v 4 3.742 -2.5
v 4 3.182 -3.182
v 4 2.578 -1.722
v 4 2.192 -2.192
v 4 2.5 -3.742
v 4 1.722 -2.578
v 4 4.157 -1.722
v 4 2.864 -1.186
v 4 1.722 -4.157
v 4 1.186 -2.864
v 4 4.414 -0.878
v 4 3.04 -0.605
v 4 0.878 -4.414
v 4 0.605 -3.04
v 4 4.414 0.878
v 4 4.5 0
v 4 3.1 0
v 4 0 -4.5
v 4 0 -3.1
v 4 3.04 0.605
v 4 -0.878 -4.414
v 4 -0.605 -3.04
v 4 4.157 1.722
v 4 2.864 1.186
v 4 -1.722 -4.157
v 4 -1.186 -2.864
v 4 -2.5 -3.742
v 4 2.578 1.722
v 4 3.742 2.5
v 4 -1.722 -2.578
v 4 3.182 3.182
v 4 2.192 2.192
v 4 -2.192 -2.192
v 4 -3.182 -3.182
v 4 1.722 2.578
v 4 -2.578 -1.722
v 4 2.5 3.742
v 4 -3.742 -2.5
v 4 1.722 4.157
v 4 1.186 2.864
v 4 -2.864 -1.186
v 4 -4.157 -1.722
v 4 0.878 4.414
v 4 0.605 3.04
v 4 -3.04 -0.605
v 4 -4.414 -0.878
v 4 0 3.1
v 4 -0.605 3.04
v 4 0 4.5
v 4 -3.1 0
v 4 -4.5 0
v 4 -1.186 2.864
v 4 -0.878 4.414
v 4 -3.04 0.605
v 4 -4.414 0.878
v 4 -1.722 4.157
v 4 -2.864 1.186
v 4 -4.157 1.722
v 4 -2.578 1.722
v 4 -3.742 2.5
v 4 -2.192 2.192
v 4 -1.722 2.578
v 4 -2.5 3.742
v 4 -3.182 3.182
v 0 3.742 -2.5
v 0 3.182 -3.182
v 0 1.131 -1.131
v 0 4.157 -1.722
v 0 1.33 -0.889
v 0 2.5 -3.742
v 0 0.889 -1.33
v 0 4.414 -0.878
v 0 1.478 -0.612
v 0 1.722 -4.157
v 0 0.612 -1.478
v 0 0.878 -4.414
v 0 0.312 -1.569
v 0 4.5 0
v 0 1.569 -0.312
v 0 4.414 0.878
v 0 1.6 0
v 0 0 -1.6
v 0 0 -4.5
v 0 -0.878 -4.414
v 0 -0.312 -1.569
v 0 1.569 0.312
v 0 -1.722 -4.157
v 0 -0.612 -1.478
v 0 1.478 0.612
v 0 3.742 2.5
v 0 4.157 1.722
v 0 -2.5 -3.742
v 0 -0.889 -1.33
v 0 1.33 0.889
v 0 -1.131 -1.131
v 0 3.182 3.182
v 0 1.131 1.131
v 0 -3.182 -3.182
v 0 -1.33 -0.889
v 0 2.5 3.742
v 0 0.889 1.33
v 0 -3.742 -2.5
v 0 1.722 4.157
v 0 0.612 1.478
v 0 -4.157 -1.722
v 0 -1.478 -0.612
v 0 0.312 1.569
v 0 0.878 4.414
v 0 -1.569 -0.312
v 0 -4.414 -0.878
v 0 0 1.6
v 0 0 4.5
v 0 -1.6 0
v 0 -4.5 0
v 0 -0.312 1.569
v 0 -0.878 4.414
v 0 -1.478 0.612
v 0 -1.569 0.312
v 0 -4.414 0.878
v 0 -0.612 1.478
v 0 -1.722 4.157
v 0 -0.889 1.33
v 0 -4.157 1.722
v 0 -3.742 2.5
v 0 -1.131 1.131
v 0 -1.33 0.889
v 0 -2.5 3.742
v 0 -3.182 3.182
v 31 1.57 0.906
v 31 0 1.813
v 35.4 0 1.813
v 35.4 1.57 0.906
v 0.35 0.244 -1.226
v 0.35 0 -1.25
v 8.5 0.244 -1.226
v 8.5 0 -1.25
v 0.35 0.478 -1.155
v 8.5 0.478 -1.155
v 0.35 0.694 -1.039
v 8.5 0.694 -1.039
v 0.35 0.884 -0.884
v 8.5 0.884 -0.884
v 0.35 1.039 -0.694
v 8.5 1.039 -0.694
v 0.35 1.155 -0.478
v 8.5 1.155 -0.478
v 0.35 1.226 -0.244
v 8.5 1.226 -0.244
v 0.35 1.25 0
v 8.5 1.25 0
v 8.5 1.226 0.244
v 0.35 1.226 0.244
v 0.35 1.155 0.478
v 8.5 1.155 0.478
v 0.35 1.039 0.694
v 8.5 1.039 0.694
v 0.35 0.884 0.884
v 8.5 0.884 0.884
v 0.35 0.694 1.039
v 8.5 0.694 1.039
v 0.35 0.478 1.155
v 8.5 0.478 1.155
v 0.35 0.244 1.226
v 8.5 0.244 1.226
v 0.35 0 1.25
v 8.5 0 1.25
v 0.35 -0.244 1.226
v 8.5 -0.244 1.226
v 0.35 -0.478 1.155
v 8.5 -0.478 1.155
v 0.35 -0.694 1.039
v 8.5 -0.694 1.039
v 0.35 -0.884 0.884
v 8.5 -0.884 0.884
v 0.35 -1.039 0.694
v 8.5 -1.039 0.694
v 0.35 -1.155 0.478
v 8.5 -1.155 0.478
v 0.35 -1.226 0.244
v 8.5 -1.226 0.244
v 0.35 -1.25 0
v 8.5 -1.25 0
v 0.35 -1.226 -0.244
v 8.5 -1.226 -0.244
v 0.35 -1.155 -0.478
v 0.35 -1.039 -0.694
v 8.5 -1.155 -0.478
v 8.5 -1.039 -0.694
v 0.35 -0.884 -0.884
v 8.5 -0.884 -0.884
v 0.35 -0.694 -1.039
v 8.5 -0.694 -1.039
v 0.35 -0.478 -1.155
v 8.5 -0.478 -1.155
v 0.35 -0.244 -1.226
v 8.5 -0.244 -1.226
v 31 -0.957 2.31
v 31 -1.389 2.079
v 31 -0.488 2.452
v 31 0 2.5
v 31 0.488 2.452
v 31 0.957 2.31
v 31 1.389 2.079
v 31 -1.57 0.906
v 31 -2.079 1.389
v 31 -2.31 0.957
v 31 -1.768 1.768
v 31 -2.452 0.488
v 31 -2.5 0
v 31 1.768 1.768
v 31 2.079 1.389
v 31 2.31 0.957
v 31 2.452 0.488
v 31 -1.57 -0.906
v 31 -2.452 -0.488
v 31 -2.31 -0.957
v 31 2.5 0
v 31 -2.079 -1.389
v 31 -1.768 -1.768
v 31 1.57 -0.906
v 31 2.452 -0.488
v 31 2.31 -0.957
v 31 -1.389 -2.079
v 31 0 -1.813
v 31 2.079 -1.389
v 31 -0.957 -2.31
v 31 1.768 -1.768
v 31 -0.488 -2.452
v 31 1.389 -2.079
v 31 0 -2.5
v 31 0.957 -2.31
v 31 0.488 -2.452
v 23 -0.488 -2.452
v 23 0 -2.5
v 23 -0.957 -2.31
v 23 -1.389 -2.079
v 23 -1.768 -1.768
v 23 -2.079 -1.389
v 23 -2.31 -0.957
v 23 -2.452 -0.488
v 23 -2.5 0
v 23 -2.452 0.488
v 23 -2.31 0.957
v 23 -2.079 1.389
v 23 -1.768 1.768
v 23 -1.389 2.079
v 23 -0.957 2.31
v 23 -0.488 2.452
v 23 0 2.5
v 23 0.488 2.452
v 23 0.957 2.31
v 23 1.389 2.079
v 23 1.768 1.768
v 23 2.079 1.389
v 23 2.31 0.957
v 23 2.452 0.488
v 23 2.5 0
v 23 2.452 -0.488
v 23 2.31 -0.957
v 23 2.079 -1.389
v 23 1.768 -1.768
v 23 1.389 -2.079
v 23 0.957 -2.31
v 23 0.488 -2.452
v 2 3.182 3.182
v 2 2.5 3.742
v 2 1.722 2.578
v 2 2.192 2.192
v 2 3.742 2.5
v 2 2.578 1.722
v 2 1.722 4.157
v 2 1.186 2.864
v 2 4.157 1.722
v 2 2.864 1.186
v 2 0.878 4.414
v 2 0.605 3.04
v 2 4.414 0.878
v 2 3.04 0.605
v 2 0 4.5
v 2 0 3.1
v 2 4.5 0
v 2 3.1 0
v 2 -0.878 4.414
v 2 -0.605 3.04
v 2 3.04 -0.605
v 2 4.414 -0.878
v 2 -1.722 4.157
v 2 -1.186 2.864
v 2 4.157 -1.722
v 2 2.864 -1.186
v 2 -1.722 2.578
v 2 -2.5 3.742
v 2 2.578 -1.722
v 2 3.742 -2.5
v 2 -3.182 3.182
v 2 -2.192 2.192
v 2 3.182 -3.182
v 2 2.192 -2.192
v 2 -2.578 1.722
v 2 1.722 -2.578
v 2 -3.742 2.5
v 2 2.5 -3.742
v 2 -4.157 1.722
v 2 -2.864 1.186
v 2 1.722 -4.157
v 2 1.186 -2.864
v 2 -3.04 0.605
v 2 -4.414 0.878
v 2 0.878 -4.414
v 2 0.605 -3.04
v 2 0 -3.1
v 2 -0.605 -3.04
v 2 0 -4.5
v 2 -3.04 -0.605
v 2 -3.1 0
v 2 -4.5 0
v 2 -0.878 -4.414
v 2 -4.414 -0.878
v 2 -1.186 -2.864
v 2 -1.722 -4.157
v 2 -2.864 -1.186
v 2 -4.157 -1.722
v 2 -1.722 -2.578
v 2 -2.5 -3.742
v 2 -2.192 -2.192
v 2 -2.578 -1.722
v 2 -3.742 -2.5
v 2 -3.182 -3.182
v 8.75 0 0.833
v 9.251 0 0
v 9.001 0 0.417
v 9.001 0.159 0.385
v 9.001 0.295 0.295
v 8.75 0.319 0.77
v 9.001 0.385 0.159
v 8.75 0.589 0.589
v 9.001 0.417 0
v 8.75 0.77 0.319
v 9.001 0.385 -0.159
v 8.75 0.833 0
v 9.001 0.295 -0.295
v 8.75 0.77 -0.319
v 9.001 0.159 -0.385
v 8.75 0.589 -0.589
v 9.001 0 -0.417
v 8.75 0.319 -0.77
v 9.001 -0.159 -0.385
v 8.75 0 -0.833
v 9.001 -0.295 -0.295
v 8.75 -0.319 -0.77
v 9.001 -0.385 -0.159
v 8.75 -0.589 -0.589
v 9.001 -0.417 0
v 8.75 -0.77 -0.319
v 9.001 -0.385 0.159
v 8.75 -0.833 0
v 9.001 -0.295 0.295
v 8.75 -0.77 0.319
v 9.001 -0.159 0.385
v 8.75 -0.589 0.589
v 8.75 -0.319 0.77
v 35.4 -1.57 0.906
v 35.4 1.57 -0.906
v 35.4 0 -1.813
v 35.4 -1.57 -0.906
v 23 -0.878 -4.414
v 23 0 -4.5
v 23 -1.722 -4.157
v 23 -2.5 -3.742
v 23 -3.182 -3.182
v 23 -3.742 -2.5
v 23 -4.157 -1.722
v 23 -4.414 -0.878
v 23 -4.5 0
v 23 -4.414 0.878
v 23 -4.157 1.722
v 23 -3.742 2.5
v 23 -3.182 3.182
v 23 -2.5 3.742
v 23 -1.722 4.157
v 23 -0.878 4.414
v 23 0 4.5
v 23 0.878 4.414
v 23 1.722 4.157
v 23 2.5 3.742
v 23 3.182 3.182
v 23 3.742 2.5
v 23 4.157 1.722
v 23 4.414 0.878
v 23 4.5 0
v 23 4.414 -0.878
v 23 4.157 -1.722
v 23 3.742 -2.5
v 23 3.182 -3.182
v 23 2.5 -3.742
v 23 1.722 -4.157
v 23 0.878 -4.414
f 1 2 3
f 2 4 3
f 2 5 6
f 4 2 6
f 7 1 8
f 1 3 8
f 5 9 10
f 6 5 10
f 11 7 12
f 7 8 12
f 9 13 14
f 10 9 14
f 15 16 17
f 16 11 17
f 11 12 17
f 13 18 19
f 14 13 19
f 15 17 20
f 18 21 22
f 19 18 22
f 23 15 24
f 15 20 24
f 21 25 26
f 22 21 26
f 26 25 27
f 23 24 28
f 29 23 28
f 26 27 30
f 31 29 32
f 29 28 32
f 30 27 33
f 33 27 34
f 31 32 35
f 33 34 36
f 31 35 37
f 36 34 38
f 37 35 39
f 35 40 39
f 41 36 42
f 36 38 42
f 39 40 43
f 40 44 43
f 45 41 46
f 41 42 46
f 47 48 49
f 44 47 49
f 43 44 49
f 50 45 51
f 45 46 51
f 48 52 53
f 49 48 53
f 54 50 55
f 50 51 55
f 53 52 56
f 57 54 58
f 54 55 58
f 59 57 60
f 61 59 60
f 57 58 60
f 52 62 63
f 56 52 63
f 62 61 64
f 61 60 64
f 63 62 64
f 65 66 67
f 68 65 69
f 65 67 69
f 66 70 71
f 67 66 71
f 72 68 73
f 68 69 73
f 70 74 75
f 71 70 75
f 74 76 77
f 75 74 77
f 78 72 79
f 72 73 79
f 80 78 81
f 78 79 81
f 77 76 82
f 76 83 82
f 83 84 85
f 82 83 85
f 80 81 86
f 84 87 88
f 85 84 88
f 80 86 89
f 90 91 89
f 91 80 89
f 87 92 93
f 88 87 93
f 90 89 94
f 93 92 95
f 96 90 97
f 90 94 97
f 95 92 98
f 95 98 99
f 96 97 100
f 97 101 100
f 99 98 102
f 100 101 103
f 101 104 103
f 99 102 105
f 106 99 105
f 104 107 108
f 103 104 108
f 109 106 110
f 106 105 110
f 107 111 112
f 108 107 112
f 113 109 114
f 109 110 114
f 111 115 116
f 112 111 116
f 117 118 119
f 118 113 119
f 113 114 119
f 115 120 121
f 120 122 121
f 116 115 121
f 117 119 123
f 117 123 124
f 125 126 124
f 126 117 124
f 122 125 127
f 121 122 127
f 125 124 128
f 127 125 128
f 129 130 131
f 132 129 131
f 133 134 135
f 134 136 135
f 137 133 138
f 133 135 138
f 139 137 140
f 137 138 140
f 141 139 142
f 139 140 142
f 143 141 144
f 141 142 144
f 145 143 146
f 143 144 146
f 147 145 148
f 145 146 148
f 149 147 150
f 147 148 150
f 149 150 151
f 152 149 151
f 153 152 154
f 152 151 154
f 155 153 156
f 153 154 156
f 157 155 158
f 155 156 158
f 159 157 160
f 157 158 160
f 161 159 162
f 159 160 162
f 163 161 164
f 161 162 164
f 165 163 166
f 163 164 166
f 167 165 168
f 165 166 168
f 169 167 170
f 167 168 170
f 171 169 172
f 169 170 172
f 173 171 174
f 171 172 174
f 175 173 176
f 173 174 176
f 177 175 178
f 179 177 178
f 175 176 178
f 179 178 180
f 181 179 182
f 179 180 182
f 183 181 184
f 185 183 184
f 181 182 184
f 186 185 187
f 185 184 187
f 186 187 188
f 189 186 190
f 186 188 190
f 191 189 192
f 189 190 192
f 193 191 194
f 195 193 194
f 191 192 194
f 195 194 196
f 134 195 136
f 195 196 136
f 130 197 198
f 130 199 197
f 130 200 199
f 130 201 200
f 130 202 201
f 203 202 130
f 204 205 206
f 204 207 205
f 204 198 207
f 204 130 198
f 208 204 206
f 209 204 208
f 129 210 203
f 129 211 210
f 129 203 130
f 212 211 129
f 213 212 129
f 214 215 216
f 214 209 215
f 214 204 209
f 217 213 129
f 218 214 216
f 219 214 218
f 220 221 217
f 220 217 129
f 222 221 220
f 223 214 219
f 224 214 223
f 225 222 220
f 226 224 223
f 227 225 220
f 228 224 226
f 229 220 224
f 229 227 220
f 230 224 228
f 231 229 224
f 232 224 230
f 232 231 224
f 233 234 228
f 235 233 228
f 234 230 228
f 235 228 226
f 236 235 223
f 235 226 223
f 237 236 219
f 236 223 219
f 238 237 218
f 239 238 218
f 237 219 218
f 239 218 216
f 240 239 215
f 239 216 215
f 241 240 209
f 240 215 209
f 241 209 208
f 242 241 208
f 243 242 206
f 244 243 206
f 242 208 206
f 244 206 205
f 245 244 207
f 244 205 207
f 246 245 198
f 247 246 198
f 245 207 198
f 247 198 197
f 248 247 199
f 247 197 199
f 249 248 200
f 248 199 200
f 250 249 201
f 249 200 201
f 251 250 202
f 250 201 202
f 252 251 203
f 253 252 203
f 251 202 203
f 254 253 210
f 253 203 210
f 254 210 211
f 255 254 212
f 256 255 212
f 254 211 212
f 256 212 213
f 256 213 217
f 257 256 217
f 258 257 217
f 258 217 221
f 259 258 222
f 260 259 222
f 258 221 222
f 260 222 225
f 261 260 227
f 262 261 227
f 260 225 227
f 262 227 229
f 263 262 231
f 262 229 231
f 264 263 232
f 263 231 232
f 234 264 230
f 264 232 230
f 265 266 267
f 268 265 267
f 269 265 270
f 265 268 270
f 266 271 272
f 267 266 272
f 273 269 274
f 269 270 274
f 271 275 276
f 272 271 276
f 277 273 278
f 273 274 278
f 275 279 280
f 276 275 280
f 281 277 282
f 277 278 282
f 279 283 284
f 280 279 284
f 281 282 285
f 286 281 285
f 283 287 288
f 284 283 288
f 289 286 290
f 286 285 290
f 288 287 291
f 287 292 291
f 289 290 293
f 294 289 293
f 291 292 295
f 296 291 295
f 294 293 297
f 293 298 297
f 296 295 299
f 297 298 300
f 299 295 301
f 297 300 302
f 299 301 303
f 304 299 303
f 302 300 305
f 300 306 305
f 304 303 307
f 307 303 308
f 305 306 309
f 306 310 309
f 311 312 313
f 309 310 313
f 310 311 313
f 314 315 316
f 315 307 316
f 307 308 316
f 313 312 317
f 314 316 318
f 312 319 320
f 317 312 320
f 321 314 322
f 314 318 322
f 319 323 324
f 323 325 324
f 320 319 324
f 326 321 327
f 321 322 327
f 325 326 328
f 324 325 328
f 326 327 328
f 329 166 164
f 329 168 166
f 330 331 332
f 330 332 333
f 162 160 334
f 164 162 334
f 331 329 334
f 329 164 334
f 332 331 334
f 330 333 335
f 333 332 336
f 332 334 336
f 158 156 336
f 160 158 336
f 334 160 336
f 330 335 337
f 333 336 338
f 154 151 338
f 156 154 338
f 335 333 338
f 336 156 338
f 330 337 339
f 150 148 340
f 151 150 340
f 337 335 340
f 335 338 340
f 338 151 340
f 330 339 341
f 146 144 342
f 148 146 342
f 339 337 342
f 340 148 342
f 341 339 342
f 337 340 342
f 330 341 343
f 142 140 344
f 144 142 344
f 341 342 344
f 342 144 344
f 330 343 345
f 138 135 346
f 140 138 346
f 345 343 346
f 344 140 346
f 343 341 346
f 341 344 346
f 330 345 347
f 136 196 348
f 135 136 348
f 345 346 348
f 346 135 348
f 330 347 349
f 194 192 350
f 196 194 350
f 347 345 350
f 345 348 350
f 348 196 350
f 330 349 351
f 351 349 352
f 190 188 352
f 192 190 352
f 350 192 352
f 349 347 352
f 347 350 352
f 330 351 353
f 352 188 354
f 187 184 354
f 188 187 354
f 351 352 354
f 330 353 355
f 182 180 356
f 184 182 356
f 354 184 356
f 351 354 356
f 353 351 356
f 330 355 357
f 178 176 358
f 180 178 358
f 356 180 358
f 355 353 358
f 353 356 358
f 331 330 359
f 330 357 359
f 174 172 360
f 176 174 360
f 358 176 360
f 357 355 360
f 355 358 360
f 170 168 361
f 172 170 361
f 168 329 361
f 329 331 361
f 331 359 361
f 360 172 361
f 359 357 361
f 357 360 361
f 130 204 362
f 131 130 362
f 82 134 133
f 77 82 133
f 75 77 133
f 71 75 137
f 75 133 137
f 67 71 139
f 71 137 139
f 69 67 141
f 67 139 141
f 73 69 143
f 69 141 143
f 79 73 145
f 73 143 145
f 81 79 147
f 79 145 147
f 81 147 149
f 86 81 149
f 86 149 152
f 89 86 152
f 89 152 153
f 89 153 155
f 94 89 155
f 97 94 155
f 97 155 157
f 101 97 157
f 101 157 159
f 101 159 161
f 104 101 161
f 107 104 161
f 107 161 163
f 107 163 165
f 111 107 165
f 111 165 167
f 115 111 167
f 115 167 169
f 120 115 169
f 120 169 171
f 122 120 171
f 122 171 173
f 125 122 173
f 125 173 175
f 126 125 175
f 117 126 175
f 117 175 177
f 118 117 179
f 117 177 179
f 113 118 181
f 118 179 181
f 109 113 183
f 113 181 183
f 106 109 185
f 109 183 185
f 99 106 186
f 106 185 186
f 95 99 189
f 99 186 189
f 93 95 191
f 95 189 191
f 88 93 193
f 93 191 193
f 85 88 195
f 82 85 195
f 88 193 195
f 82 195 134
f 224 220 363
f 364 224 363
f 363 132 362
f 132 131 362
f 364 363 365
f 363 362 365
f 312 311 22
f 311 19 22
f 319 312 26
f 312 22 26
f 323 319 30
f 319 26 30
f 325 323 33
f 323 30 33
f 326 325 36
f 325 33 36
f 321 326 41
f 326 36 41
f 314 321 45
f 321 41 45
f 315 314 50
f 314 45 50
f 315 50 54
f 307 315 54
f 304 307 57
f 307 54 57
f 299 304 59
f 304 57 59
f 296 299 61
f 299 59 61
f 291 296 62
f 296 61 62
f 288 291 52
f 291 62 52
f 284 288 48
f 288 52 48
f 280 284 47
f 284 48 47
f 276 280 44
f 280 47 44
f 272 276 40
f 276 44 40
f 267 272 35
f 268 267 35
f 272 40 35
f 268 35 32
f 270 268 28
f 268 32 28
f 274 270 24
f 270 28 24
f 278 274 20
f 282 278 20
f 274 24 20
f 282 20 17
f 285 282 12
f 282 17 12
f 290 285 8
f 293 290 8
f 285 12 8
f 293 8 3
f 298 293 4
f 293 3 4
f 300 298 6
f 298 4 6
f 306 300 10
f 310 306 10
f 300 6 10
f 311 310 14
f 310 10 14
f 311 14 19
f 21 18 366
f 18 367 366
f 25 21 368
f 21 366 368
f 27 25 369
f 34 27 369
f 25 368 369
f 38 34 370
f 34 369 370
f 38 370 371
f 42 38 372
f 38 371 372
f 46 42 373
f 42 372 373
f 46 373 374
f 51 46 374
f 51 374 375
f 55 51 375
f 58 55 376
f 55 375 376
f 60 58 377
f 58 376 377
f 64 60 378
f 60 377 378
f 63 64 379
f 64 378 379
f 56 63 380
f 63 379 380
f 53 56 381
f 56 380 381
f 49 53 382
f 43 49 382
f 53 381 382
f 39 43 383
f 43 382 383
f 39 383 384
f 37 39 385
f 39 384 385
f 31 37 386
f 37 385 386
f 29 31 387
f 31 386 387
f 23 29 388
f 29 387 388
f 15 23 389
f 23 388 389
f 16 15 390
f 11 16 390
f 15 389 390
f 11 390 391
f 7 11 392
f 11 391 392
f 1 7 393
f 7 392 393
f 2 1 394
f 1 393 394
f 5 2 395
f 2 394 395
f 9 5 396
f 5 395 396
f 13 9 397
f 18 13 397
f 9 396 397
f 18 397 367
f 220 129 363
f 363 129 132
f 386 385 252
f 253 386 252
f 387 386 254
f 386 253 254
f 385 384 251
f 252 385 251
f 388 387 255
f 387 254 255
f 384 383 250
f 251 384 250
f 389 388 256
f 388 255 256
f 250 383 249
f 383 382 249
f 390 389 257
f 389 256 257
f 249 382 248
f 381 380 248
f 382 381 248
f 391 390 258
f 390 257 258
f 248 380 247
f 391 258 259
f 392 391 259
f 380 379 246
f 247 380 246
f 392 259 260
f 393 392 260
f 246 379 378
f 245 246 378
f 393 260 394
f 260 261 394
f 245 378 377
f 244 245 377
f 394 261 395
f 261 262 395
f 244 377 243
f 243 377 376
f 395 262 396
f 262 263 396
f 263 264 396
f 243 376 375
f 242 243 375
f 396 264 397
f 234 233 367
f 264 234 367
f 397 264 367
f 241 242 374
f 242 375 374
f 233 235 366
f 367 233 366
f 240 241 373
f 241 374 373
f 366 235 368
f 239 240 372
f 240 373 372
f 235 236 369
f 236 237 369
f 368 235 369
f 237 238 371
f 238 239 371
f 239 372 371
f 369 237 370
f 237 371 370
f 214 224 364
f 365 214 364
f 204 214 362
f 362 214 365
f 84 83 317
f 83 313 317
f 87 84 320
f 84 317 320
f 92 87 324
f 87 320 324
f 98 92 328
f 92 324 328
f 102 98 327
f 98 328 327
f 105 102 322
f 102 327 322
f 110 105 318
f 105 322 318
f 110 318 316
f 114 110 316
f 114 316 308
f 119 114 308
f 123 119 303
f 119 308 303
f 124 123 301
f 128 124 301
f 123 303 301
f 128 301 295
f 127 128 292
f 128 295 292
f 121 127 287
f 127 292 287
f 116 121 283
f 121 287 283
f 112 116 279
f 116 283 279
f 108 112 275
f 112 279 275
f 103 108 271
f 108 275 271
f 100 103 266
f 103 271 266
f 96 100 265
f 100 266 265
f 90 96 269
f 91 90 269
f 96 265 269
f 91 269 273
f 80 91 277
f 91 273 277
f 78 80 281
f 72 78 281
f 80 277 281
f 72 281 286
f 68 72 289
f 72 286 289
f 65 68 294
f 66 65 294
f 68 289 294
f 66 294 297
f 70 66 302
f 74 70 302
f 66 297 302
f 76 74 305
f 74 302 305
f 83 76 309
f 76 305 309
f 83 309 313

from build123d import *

# Parameters (mm, degrees)
SKETCH_2_W                  = 4.4
SKETCH_2_H                  = 0.93
CUT_EXTRUDE_1_DEPTH         = 36.967485317
PATTERN_CIRCULAR_1_COUNT    = 6
HOLE_WIZARD_M31_D           = 2.5
HOLE_WIZARD_M31_DEPTH       = 8.5
HOLE_WIZARD_M31_CSINK_D     = 3.2
HOLE_WIZARD_M31_CSINK_ANGLE = 90
HOLE_WIZARD_M31_TIP         = 0.751075774


with BuildPart() as part:
    # Эскиз1 → Повернуть1 (revolve)
    with BuildSketch(Plane.XY):
        Polygon((0, 0), (0, 4.5), (2, 4.5), (2, 3.1), (4, 3.1), (4, 4.5), (23, 4.5), (23, 2.5), (35.4, 2.5), (35.4, 0), align=None)
    revolve(axis=Axis((0, 0, 0), (-1, 0, 0)))

    # Эскиз2 → Вырез-Вытянуть1 (cut, symmetric)
    with BuildSketch(Plane.XY):
        with Locations((33.2, 2.035)):
            Rectangle(SKETCH_2_W, SKETCH_2_H)
    cut_extrude_1 = extrude(amount=CUT_EXTRUDE_1_DEPTH, both=True, mode=Mode.SUBTRACT)

    # Круговой массив1: Вырез-Вытянуть1 ×6 about axis
    pattern_circular_1_axis = Axis((0, 0, 0), (1, 0, 0))
    for i in range(1, PATTERN_CIRCULAR_1_COUNT):
        add(cut_extrude_1.rotate(pattern_circular_1_axis, i * 360 / PATTERN_CIRCULAR_1_COUNT), mode=Mode.SUBTRACT)

    # Отверстие обработанное метчиком M31
    with Locations(Plane.ZY):
        with Locations((0, 0)):
            CounterSinkHole(HOLE_WIZARD_M31_D / 2, HOLE_WIZARD_M31_CSINK_D / 2, depth=HOLE_WIZARD_M31_DEPTH, counter_sink_angle=HOLE_WIZARD_M31_CSINK_ANGLE)
            with Locations((0, 0, -(HOLE_WIZARD_M31_DEPTH + HOLE_WIZARD_M31_TIP / 2))):  # 118° drill point
                Cone(0, HOLE_WIZARD_M31_D / 2, HOLE_WIZARD_M31_TIP, mode=Mode.SUBTRACT)


solid = part.part
